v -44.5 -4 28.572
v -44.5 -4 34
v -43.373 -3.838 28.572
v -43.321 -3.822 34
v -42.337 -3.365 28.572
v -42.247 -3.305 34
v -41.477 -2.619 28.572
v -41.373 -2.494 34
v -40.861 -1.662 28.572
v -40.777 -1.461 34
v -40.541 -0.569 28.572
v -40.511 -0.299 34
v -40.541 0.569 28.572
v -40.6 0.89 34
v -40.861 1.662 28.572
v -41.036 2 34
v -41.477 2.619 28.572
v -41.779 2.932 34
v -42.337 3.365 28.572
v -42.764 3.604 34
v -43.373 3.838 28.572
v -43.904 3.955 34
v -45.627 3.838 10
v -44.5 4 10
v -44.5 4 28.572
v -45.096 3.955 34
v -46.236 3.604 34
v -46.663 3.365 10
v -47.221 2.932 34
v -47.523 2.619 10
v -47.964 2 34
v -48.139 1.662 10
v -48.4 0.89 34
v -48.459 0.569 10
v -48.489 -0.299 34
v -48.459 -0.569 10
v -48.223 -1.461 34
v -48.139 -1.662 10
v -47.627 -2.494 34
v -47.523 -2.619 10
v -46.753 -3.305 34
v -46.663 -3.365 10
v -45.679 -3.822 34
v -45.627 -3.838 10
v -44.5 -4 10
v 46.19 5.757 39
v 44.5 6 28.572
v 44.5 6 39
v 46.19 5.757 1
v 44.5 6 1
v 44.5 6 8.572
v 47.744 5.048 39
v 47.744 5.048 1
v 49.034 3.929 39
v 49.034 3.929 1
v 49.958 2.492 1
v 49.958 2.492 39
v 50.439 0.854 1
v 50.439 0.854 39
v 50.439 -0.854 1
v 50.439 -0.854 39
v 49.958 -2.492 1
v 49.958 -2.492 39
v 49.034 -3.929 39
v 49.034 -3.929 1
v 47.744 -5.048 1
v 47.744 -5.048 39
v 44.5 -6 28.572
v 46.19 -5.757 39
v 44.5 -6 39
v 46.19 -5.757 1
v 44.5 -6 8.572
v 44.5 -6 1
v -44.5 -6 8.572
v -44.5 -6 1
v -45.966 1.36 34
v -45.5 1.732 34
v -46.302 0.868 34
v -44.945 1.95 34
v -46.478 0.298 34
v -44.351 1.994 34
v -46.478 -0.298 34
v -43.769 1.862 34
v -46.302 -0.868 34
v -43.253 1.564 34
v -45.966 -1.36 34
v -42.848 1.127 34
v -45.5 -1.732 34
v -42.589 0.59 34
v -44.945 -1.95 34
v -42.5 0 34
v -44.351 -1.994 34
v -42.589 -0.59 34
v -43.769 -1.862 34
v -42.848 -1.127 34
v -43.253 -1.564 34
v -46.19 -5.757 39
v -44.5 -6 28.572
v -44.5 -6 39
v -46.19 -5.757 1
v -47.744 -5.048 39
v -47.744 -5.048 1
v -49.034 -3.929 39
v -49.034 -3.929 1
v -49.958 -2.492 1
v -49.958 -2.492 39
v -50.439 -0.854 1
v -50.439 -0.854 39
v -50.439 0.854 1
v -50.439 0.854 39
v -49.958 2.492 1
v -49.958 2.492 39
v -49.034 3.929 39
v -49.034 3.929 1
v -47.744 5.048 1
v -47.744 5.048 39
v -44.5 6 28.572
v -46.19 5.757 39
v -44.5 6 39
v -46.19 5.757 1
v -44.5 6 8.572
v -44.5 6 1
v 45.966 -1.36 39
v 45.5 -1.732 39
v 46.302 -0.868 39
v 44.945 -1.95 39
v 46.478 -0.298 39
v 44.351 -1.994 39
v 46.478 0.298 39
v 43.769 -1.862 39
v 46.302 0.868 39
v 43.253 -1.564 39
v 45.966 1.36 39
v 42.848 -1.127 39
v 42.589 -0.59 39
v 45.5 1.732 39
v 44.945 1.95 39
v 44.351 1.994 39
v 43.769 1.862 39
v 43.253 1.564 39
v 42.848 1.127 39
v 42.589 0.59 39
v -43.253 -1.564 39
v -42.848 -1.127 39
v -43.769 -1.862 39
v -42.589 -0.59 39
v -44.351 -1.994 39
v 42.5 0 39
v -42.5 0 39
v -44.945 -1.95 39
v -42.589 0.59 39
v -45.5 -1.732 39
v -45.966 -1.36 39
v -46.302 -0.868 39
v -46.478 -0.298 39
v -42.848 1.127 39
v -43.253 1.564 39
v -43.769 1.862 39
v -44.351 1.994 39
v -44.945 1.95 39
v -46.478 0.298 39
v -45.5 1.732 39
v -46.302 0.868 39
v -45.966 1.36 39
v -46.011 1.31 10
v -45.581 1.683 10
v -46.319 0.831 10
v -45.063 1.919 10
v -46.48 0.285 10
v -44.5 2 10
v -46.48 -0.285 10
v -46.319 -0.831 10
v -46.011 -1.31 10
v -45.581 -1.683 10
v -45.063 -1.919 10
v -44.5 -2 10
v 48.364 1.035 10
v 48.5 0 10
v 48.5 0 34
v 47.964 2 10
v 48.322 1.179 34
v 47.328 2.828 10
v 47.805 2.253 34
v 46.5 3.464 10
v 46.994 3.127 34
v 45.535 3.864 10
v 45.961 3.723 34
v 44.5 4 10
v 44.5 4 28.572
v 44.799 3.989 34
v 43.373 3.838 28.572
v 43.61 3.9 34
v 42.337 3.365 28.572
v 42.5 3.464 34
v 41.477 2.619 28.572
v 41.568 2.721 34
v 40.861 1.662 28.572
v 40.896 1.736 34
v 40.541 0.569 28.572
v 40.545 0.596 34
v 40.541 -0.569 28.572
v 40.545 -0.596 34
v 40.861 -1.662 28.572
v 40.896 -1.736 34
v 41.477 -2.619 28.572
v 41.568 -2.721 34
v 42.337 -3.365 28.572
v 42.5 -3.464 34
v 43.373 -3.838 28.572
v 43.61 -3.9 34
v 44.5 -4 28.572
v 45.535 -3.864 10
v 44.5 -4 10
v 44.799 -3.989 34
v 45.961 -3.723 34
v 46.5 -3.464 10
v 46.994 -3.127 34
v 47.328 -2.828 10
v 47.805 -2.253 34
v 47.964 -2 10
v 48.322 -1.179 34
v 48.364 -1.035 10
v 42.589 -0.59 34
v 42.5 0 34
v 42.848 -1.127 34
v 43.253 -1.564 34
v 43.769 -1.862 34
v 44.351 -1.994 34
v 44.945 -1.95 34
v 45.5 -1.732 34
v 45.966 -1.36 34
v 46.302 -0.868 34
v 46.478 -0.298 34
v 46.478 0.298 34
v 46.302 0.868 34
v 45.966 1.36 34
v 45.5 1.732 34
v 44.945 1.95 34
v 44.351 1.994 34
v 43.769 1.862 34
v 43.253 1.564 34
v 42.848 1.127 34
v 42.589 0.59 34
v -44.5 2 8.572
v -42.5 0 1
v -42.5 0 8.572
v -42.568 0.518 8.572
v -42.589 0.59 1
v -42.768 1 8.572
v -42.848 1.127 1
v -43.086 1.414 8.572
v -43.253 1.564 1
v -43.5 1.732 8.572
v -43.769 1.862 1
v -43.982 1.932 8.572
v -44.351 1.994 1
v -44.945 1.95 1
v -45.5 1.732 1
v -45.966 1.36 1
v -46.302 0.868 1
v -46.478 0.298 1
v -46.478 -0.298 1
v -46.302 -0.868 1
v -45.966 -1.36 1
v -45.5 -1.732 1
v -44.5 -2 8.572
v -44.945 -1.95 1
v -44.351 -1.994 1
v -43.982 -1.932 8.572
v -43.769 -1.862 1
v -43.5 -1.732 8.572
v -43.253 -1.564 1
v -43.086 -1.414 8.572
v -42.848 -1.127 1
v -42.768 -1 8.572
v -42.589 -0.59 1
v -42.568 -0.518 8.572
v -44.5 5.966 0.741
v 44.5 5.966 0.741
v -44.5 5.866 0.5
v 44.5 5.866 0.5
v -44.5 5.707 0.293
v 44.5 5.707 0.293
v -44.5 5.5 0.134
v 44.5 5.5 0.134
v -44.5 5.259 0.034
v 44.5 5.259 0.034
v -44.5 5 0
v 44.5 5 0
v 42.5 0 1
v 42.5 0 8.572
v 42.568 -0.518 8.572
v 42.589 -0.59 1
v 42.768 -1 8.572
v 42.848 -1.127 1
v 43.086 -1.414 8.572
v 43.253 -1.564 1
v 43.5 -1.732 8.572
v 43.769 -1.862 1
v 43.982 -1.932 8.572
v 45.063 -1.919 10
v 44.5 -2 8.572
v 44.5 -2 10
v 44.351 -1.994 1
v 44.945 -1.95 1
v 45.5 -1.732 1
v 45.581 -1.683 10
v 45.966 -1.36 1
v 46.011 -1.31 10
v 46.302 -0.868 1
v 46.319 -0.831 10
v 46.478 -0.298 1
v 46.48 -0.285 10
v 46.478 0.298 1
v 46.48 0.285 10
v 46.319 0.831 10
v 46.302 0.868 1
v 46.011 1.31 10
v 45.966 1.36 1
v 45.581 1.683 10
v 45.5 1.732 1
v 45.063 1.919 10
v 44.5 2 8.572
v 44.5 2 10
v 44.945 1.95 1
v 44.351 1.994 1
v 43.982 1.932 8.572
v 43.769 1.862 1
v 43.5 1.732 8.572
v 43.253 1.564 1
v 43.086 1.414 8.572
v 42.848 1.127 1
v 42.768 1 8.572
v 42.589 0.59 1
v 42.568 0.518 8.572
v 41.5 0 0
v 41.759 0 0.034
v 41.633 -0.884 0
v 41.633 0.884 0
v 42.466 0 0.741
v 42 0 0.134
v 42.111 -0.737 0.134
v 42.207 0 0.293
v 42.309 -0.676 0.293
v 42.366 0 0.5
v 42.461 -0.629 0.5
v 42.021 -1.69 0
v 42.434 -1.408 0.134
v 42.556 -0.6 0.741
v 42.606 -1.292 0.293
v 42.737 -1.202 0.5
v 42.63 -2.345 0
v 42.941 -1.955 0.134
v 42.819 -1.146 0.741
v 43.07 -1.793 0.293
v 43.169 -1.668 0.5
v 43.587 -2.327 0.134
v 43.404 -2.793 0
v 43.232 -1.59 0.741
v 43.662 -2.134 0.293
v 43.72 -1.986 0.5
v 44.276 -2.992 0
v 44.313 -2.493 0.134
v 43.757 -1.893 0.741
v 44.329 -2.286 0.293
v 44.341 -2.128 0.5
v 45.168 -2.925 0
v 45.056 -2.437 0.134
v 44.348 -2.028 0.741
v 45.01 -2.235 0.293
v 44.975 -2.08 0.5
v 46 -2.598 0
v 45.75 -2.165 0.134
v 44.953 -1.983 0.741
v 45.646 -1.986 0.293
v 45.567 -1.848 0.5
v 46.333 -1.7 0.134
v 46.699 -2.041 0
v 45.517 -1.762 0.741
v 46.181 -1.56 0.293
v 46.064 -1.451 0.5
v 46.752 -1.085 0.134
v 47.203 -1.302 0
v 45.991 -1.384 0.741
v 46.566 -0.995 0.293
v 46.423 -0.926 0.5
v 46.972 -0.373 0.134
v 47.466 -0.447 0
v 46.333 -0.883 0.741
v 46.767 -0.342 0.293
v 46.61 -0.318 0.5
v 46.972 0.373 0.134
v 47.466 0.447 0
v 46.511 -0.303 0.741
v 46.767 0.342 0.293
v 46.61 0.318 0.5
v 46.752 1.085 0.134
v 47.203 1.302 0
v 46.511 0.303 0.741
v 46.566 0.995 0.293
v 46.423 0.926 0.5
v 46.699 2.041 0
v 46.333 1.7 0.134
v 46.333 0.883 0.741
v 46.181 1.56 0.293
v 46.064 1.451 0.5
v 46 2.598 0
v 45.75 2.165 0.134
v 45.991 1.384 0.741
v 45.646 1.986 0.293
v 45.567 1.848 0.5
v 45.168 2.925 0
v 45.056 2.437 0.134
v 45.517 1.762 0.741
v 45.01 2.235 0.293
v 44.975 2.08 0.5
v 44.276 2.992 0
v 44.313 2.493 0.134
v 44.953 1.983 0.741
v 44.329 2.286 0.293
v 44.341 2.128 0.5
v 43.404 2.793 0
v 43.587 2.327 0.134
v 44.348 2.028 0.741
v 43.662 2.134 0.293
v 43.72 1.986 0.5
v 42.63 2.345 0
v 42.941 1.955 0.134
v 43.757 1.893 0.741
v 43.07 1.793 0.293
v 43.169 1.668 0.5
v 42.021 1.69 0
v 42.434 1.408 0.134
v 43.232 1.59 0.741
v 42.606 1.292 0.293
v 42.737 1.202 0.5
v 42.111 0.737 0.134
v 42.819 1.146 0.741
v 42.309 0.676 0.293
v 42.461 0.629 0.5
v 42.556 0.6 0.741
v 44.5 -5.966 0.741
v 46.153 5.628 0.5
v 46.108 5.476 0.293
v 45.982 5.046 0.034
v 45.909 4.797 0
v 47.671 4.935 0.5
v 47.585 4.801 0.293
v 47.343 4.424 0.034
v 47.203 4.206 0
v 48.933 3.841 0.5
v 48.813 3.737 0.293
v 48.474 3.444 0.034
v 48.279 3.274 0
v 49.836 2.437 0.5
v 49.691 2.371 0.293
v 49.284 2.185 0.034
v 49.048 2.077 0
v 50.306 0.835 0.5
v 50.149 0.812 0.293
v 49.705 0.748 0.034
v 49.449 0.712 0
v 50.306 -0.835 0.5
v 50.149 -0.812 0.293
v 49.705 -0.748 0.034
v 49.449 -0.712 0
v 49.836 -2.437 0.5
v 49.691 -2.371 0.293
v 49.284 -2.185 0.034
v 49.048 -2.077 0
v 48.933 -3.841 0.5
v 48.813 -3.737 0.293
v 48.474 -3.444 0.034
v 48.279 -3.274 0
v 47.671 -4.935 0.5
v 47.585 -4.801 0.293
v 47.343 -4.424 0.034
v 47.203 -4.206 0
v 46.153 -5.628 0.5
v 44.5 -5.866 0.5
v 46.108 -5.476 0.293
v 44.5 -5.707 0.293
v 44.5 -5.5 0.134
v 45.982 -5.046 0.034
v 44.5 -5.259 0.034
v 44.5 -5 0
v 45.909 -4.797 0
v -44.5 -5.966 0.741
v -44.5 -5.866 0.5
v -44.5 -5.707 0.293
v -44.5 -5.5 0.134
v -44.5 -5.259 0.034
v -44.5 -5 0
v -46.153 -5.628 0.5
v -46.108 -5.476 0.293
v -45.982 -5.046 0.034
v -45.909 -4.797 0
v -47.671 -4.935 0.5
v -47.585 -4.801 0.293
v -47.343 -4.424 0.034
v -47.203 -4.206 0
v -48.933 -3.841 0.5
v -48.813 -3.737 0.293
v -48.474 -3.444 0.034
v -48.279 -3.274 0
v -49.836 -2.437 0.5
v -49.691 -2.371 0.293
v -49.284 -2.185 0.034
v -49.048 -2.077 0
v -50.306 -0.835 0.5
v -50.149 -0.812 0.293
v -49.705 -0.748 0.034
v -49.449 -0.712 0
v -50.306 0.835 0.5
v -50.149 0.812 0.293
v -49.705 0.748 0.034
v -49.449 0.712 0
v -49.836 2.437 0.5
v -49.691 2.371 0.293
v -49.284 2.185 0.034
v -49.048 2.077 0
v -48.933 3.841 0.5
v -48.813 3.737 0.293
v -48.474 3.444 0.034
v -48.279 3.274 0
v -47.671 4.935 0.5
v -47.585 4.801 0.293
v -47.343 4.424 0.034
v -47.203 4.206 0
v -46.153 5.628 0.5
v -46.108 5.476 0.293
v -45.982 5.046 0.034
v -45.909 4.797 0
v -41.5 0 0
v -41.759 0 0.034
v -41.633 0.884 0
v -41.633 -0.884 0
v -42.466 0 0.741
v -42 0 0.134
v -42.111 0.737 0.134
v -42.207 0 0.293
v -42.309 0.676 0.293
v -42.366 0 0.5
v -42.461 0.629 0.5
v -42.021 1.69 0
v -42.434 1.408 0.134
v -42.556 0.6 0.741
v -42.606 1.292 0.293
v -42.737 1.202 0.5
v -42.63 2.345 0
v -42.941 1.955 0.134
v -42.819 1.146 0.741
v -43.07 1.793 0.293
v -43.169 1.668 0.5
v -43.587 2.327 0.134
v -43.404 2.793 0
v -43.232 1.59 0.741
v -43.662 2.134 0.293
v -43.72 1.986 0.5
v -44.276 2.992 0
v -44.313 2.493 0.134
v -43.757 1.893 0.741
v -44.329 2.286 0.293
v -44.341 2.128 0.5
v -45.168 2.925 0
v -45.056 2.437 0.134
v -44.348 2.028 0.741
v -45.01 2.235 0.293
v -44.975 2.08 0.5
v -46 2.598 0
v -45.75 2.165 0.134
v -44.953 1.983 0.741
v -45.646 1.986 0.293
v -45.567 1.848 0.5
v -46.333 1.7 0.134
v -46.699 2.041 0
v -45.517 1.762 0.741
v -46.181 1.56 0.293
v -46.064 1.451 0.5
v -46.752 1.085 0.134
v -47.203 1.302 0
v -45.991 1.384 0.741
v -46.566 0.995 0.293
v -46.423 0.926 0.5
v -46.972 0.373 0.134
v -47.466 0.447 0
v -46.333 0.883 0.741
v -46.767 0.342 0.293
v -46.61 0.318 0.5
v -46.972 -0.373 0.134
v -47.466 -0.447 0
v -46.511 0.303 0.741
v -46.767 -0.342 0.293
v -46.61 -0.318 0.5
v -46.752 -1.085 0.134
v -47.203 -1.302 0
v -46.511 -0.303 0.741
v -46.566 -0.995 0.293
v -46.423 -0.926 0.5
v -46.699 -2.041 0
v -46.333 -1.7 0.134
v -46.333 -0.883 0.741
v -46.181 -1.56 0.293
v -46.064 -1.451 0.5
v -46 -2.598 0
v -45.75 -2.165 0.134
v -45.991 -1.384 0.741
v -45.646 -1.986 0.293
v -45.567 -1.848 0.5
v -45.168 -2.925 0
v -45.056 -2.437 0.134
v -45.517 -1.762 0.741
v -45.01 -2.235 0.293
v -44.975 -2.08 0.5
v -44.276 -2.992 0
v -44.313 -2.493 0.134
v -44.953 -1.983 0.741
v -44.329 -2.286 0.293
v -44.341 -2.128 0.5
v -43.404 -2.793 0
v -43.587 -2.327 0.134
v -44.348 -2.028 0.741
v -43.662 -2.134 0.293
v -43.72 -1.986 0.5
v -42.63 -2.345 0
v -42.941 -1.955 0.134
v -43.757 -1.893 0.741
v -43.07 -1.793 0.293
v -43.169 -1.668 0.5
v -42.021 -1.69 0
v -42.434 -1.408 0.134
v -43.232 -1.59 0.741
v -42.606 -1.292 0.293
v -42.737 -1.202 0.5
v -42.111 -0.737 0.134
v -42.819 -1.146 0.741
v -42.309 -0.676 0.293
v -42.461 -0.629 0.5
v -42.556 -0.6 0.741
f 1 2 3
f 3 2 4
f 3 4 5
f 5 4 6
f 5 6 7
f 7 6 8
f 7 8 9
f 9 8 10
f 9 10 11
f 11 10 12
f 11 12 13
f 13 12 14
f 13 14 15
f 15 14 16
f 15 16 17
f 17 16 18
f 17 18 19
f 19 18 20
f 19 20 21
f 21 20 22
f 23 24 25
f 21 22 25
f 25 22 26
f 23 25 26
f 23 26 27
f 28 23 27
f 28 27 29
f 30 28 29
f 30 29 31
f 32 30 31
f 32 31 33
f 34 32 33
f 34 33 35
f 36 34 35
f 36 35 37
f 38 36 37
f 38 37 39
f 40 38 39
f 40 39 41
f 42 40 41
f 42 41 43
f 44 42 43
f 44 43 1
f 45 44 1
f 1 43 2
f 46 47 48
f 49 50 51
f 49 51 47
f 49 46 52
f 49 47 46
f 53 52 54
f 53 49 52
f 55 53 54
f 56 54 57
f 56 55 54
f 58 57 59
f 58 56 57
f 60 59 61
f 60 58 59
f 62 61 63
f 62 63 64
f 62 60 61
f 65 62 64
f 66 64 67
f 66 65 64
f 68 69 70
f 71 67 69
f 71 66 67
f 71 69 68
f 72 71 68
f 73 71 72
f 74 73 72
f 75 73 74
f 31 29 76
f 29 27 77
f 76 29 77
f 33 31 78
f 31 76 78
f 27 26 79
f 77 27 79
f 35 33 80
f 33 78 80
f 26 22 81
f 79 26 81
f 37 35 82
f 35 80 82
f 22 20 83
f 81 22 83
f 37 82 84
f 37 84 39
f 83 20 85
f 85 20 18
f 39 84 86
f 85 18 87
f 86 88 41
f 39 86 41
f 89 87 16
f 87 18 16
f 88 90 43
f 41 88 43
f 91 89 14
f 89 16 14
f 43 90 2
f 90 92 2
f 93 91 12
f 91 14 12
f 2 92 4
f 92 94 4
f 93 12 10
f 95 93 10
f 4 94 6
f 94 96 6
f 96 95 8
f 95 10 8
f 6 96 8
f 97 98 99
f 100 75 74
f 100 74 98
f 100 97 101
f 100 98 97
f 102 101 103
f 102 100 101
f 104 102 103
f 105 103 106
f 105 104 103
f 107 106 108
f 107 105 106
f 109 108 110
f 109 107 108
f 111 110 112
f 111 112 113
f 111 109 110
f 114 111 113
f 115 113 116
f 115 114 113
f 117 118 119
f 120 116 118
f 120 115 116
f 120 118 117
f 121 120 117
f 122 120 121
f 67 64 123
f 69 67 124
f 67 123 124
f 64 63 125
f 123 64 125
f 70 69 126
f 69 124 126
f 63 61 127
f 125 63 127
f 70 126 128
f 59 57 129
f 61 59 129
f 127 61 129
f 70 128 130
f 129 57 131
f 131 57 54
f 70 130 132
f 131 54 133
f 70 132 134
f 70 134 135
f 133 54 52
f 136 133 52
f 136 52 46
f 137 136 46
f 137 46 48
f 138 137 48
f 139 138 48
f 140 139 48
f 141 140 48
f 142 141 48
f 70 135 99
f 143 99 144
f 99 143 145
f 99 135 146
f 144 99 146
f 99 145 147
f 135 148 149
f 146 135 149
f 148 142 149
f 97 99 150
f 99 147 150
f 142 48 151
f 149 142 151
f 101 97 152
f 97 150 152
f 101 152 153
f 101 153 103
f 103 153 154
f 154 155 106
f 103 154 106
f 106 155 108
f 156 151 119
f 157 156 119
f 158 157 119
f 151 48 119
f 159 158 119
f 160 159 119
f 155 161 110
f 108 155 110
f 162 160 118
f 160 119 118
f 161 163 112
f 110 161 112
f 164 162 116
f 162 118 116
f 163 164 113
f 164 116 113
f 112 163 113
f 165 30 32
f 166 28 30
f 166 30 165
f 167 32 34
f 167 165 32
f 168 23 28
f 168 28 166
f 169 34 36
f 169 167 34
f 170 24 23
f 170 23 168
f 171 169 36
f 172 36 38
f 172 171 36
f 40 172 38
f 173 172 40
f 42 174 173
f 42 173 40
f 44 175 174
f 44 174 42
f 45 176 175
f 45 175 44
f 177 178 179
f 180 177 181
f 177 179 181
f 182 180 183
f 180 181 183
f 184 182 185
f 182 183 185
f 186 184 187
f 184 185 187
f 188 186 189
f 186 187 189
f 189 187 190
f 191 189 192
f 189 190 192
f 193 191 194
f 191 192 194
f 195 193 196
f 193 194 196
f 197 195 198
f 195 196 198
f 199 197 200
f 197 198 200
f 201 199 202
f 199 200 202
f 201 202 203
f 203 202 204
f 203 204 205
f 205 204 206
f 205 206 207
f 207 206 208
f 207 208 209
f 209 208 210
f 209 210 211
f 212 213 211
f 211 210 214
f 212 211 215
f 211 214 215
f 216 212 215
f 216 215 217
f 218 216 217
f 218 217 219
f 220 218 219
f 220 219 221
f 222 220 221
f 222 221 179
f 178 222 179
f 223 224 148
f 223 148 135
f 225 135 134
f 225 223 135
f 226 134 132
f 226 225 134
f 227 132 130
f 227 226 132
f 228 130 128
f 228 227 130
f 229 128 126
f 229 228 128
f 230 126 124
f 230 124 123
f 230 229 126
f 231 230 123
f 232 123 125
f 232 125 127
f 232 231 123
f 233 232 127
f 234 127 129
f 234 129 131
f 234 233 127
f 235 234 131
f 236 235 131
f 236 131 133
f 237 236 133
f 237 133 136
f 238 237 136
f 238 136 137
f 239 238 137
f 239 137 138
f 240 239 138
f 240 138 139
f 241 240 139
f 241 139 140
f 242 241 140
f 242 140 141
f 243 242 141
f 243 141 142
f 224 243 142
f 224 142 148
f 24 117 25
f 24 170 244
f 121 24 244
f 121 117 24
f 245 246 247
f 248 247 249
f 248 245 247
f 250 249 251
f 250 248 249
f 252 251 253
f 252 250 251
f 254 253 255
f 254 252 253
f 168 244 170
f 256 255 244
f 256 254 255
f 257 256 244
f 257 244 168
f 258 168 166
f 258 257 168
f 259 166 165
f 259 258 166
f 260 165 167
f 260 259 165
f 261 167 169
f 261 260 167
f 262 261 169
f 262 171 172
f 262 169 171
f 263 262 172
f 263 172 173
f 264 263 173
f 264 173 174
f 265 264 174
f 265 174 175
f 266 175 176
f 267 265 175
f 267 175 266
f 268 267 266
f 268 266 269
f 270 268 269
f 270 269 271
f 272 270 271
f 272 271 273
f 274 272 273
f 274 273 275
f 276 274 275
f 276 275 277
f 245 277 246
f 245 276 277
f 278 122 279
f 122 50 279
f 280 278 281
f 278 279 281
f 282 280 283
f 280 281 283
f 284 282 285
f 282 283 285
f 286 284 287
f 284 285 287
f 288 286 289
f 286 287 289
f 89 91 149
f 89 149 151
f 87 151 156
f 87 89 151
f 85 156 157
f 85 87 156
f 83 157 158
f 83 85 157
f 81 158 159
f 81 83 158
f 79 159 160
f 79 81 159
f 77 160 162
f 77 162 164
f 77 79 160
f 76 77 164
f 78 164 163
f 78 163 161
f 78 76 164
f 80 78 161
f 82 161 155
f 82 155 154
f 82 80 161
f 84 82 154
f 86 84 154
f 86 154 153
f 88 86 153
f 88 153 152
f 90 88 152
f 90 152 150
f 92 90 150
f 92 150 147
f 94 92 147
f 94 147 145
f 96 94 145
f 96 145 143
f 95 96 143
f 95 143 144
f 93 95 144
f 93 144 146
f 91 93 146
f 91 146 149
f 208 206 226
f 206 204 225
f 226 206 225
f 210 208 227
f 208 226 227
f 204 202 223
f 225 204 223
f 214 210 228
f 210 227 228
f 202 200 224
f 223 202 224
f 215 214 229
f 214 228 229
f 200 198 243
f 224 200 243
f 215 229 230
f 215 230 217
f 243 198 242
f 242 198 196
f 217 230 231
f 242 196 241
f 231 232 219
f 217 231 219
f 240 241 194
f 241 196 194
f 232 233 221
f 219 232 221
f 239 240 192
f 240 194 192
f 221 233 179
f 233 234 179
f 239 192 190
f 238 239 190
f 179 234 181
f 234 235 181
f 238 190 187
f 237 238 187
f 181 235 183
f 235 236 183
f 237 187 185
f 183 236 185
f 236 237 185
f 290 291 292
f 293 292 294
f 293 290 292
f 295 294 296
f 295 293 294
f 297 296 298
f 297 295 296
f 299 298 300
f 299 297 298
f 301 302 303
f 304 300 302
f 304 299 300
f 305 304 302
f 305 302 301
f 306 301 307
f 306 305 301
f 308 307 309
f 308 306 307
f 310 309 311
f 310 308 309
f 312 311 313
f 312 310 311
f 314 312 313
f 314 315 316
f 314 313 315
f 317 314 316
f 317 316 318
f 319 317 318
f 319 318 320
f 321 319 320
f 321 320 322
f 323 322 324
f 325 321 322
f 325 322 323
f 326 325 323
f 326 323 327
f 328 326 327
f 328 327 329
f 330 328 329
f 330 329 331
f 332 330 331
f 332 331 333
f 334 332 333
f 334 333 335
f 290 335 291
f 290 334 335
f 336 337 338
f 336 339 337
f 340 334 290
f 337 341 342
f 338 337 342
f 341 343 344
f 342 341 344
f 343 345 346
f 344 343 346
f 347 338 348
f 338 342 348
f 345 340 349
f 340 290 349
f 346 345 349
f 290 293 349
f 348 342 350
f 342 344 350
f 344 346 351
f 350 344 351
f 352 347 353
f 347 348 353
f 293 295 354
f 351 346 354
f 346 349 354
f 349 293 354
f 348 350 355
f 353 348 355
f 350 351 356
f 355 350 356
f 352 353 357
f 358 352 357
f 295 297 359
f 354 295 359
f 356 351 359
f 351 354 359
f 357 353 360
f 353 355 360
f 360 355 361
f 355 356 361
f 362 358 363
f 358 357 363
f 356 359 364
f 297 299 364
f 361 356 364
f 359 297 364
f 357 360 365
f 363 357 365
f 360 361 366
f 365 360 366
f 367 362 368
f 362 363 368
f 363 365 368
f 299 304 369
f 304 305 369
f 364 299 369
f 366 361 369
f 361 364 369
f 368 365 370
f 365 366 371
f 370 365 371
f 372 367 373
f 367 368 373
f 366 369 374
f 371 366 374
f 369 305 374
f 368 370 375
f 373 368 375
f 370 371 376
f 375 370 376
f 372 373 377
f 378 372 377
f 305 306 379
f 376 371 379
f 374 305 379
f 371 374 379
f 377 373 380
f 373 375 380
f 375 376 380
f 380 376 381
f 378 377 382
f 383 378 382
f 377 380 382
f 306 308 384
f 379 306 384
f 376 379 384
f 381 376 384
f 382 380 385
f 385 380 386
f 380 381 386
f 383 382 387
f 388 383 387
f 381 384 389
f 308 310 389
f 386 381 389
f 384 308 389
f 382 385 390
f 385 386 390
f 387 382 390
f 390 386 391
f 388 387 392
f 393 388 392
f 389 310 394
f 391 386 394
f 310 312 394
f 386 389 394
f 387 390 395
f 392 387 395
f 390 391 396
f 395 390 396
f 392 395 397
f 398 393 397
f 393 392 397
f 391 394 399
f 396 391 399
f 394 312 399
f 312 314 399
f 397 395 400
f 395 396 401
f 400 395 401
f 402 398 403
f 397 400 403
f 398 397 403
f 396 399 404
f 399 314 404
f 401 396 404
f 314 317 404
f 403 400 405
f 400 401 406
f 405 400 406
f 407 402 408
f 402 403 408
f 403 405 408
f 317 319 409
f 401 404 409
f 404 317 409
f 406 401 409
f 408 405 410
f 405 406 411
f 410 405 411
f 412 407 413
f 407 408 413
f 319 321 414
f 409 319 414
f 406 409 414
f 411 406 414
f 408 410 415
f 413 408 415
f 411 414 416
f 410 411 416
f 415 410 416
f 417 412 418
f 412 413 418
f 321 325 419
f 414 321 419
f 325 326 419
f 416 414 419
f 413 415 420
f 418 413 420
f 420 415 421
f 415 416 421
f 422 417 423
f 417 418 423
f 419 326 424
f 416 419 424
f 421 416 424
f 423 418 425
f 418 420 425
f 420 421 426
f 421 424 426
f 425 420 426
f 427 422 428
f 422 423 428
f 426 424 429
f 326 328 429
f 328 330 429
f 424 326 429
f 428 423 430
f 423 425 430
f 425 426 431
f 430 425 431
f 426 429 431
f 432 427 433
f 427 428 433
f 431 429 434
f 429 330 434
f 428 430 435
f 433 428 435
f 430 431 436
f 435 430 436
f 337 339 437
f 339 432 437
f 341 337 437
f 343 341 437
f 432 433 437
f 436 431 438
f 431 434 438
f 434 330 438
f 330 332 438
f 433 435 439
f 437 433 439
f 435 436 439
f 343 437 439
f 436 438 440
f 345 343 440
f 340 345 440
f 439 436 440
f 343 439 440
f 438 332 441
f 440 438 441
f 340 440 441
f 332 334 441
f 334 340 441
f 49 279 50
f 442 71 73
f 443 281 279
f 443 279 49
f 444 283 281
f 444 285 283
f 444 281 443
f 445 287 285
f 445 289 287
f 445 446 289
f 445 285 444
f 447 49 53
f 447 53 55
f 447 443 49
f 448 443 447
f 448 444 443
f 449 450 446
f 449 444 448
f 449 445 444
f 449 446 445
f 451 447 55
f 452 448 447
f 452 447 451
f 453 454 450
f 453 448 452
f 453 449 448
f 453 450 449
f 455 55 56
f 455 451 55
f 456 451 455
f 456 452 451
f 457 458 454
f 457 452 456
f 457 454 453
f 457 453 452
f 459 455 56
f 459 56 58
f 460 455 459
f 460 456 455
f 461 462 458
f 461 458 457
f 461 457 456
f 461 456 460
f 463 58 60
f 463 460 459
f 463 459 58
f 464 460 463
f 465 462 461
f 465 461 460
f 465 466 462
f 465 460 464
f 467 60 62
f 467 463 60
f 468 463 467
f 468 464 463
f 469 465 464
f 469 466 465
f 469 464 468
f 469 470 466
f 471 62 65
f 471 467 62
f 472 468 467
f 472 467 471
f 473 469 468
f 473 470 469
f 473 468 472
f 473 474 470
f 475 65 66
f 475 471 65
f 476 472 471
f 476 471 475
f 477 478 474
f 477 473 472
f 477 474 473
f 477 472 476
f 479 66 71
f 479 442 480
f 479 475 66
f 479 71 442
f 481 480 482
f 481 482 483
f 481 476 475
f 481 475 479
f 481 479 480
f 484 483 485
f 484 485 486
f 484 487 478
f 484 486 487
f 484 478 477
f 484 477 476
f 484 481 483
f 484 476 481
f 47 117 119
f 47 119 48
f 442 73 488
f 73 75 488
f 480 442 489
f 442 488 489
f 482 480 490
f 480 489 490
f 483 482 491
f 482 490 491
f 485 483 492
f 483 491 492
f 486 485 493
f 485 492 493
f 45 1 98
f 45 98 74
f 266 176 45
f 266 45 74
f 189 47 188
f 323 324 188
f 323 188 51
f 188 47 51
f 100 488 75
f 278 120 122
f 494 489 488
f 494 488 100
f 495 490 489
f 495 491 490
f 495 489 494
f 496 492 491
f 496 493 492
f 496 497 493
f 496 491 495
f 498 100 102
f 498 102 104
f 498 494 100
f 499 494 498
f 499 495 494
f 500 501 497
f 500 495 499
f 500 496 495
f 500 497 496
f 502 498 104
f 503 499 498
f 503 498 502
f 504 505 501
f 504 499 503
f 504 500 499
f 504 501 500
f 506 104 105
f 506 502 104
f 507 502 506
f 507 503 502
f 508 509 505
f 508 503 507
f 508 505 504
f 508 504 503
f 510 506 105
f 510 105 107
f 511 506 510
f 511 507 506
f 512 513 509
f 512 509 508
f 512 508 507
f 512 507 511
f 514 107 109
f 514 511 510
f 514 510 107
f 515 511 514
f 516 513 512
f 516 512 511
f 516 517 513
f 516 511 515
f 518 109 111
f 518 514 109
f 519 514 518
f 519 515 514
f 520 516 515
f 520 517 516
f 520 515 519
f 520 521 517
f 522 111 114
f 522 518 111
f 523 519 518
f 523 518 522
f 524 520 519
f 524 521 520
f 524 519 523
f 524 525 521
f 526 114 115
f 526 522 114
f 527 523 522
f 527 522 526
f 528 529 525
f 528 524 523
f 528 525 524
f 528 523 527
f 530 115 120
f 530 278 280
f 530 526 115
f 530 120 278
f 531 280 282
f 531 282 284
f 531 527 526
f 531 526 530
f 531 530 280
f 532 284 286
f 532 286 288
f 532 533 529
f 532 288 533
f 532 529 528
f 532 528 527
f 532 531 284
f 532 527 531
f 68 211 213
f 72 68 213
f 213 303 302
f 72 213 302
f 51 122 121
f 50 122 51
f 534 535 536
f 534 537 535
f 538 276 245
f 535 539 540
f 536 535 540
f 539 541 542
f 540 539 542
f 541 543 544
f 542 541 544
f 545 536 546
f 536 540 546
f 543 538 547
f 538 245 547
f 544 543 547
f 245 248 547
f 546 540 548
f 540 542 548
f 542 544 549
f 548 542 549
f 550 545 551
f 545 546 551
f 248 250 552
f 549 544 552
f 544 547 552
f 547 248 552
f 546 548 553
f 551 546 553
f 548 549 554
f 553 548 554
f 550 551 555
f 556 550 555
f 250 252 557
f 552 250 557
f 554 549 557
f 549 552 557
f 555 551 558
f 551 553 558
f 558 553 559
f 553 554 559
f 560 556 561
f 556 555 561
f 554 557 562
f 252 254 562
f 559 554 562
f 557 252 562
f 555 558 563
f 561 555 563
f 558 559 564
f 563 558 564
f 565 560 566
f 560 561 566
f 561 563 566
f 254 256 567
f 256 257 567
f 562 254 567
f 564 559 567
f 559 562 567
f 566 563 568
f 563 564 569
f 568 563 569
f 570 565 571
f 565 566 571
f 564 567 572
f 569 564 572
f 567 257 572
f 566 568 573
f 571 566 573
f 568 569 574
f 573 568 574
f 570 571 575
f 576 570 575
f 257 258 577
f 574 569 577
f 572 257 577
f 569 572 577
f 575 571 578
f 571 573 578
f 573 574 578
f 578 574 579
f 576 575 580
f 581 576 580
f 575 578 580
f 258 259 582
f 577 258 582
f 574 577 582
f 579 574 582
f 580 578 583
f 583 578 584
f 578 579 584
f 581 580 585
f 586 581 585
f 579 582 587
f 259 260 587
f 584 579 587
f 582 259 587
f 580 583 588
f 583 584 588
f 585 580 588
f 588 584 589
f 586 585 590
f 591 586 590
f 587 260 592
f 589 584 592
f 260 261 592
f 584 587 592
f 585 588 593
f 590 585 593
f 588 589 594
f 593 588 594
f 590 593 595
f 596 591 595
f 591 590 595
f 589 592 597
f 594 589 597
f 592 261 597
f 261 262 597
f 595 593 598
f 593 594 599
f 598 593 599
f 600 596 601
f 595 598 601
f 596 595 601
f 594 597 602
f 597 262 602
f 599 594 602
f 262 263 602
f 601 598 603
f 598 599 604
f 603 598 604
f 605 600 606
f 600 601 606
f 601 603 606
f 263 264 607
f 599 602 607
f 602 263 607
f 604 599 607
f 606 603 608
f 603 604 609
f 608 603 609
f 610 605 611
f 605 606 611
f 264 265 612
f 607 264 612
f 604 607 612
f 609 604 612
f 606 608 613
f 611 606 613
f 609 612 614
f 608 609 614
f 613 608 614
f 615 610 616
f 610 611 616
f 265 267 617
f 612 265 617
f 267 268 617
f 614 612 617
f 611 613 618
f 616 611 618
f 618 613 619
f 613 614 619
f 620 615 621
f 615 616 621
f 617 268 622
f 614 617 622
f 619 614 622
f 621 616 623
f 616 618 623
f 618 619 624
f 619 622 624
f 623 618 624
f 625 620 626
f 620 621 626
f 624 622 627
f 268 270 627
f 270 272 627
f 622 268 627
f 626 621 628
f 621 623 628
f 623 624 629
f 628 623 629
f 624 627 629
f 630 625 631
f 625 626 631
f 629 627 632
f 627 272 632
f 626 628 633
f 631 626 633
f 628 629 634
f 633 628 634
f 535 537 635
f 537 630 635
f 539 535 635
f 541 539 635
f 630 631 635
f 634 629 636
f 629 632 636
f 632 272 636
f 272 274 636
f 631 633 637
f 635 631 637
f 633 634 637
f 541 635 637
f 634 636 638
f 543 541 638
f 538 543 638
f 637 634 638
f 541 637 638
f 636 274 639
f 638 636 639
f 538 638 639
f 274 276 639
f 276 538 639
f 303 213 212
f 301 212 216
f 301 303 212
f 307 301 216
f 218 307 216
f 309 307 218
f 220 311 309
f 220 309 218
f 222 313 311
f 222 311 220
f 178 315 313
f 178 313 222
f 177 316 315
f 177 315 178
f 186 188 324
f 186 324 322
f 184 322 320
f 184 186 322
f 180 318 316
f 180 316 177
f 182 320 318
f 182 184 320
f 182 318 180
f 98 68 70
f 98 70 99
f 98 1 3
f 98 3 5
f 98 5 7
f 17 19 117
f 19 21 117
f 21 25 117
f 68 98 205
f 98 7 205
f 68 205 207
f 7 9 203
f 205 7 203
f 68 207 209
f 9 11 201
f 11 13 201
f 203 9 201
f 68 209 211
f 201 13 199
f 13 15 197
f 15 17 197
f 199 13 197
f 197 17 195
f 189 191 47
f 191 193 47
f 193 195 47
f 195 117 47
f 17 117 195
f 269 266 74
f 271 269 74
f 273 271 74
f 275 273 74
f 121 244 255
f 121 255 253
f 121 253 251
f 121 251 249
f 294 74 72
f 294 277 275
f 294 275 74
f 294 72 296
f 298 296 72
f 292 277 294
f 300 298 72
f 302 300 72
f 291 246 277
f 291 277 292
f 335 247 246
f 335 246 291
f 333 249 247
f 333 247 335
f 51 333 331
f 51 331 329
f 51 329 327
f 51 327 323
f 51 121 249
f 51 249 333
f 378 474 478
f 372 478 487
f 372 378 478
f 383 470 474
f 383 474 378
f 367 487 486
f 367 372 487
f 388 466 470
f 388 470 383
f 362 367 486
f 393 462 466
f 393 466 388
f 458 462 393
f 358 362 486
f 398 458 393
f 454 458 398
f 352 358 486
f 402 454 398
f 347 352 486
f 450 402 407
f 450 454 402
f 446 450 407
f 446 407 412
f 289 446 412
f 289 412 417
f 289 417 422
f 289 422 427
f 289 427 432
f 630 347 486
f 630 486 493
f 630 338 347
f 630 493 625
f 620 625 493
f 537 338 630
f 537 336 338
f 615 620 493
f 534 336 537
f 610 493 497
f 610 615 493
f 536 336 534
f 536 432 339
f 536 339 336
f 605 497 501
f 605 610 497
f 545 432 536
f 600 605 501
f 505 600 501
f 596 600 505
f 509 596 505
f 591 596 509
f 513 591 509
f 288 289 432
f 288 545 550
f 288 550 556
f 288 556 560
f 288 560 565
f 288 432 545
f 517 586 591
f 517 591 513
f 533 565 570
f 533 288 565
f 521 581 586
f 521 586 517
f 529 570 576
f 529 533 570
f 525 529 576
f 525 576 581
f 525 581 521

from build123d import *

# Parameters (mm, degrees)
CROQUIS1_R              = 2
SALIENTE_EXTRUIR1_DEPTH = 39
CROQUIS2_W              = 89
CROQUIS2_H              = 20
CORTAR_EXTRUIR1_DEPTH   = 39
CORTAR_EXTRUIR2_START   = -5
CROQUIS4_R              = 4
CORTAR_EXTRUIR2_DEPTH   = 24
REDONDEO1_R             = 1


with BuildPart() as part:
    # Croquis1 → Saliente-Extruir1 (new body)
    with BuildSketch(Plane.XY):
        with BuildLine():
            Line((-44.5, 6), (44.5, 6))
            ThreePointArc((44.5, 6), (50.5, 0), (44.5, -6))
            Line((44.5, -6), (-44.5, -6))
            ThreePointArc((-44.5, -6), (-50.5, 0), (-44.5, 6))
        make_face()
        with Locations((-44.5, 0)):
            Circle(CROQUIS1_R, mode=Mode.SUBTRACT)
        with Locations(Location((44.5, 0, 0), (0, 0, 180))):
            Circle(CROQUIS1_R, mode=Mode.SUBTRACT)
    extrude(amount=SALIENTE_EXTRUIR1_DEPTH)

    # Croquis2 → Cortar-Extruir1 (cut)
    with BuildSketch(Plane(origin=(0, 6, 0), x_dir=(1, 0, 0), z_dir=(0, 1, 0))):
        with Locations((0, -18.571649076)):
            Rectangle(CROQUIS2_W, CROQUIS2_H)
    extrude(amount=-CORTAR_EXTRUIR1_DEPTH, mode=Mode.SUBTRACT)

    # Croquis4 → Cortar-Extruir2 (cut)
    with BuildSketch(Plane.XY.offset(39).offset(CORTAR_EXTRUIR2_START)):
        with Locations((44.5, 0)):
            Circle(CROQUIS4_R)
        with Locations(Location((-44.5, 0, 0), (0, 0, 270))):
            Circle(CROQUIS4_R)
    extrude(amount=-CORTAR_EXTRUIR2_DEPTH, mode=Mode.SUBTRACT)

    # Redondeo1
    redondeo1_edges = [part.edges().sort_by_distance(p)[0] for p in [
        (-46.5, 0, 0),
        (46.5, 0, 0),
        (0, 6, 0),
        (50.5, 0, 0),
        (0, -6, 0),
        (-50.5, 0, 0),
    ]]
    fillet(redondeo1_edges, radius=REDONDEO1_R)


solid = part.part
